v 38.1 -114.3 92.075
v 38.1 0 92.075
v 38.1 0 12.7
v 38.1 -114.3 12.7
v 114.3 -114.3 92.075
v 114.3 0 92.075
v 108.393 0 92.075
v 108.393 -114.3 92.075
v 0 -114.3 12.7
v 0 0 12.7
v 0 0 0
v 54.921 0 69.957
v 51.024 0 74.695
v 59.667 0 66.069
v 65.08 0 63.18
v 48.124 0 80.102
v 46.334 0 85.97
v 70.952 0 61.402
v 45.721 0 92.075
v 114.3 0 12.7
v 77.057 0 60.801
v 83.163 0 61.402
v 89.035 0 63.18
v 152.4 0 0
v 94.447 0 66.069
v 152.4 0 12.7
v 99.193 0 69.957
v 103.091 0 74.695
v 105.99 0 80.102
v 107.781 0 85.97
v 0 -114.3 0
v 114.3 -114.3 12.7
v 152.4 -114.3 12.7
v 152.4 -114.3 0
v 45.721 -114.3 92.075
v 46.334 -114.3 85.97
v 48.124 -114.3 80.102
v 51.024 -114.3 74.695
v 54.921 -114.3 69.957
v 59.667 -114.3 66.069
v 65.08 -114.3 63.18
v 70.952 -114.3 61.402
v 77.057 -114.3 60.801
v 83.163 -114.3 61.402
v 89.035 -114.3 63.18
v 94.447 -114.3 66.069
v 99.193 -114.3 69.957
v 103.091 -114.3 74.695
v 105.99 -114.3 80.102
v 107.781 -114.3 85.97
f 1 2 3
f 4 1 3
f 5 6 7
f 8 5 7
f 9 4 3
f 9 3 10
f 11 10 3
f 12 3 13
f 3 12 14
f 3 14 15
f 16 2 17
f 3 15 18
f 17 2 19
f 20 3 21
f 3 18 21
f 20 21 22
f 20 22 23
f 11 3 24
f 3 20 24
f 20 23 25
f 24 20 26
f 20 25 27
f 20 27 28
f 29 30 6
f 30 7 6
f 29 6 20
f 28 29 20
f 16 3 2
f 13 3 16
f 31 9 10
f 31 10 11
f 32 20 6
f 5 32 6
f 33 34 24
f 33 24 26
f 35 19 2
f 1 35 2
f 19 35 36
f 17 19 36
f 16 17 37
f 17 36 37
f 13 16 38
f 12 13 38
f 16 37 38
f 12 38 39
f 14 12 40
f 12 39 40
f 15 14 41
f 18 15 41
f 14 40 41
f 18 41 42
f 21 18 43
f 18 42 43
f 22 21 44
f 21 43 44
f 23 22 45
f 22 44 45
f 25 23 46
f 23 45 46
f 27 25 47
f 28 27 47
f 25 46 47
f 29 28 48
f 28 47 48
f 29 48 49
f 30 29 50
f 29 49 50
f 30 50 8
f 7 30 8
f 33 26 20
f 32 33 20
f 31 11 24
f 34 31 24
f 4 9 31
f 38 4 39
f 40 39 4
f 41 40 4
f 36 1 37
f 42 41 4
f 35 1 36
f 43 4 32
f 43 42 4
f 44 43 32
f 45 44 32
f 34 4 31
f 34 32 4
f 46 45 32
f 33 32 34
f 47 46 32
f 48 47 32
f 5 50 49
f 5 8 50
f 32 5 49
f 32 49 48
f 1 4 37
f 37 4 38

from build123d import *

# Parameters (mm, degrees)
F1_DEPTH = 114.3
F3_DEPTH = 114.3


with BuildPart() as f1:
    # F0 (on Front) → F1 (new body)
    with BuildSketch(Plane.XZ):
        Polygon((0, 12.7), (0, 0), (152.4, 0), (152.4, 12.7), (114.3, 12.7), (114.3, 92.075), (38.1, 92.075), (38.1, 12.7), align=None)
    extrude(amount=F1_DEPTH)

    # F2 (on face) → F3 (cut, through all)
    with BuildSketch(Plane.XZ.offset(114.3)):
        with BuildLine():
            Line((108.393453, 92.075), (45.721143, 92.075))
            ThreePointArc((45.721143, 92.075), (77.057298, 60.801002), (108.393453, 92.075))
        make_face()
    extrude(amount=-F3_DEPTH, mode=Mode.SUBTRACT)


solid = f1.part
